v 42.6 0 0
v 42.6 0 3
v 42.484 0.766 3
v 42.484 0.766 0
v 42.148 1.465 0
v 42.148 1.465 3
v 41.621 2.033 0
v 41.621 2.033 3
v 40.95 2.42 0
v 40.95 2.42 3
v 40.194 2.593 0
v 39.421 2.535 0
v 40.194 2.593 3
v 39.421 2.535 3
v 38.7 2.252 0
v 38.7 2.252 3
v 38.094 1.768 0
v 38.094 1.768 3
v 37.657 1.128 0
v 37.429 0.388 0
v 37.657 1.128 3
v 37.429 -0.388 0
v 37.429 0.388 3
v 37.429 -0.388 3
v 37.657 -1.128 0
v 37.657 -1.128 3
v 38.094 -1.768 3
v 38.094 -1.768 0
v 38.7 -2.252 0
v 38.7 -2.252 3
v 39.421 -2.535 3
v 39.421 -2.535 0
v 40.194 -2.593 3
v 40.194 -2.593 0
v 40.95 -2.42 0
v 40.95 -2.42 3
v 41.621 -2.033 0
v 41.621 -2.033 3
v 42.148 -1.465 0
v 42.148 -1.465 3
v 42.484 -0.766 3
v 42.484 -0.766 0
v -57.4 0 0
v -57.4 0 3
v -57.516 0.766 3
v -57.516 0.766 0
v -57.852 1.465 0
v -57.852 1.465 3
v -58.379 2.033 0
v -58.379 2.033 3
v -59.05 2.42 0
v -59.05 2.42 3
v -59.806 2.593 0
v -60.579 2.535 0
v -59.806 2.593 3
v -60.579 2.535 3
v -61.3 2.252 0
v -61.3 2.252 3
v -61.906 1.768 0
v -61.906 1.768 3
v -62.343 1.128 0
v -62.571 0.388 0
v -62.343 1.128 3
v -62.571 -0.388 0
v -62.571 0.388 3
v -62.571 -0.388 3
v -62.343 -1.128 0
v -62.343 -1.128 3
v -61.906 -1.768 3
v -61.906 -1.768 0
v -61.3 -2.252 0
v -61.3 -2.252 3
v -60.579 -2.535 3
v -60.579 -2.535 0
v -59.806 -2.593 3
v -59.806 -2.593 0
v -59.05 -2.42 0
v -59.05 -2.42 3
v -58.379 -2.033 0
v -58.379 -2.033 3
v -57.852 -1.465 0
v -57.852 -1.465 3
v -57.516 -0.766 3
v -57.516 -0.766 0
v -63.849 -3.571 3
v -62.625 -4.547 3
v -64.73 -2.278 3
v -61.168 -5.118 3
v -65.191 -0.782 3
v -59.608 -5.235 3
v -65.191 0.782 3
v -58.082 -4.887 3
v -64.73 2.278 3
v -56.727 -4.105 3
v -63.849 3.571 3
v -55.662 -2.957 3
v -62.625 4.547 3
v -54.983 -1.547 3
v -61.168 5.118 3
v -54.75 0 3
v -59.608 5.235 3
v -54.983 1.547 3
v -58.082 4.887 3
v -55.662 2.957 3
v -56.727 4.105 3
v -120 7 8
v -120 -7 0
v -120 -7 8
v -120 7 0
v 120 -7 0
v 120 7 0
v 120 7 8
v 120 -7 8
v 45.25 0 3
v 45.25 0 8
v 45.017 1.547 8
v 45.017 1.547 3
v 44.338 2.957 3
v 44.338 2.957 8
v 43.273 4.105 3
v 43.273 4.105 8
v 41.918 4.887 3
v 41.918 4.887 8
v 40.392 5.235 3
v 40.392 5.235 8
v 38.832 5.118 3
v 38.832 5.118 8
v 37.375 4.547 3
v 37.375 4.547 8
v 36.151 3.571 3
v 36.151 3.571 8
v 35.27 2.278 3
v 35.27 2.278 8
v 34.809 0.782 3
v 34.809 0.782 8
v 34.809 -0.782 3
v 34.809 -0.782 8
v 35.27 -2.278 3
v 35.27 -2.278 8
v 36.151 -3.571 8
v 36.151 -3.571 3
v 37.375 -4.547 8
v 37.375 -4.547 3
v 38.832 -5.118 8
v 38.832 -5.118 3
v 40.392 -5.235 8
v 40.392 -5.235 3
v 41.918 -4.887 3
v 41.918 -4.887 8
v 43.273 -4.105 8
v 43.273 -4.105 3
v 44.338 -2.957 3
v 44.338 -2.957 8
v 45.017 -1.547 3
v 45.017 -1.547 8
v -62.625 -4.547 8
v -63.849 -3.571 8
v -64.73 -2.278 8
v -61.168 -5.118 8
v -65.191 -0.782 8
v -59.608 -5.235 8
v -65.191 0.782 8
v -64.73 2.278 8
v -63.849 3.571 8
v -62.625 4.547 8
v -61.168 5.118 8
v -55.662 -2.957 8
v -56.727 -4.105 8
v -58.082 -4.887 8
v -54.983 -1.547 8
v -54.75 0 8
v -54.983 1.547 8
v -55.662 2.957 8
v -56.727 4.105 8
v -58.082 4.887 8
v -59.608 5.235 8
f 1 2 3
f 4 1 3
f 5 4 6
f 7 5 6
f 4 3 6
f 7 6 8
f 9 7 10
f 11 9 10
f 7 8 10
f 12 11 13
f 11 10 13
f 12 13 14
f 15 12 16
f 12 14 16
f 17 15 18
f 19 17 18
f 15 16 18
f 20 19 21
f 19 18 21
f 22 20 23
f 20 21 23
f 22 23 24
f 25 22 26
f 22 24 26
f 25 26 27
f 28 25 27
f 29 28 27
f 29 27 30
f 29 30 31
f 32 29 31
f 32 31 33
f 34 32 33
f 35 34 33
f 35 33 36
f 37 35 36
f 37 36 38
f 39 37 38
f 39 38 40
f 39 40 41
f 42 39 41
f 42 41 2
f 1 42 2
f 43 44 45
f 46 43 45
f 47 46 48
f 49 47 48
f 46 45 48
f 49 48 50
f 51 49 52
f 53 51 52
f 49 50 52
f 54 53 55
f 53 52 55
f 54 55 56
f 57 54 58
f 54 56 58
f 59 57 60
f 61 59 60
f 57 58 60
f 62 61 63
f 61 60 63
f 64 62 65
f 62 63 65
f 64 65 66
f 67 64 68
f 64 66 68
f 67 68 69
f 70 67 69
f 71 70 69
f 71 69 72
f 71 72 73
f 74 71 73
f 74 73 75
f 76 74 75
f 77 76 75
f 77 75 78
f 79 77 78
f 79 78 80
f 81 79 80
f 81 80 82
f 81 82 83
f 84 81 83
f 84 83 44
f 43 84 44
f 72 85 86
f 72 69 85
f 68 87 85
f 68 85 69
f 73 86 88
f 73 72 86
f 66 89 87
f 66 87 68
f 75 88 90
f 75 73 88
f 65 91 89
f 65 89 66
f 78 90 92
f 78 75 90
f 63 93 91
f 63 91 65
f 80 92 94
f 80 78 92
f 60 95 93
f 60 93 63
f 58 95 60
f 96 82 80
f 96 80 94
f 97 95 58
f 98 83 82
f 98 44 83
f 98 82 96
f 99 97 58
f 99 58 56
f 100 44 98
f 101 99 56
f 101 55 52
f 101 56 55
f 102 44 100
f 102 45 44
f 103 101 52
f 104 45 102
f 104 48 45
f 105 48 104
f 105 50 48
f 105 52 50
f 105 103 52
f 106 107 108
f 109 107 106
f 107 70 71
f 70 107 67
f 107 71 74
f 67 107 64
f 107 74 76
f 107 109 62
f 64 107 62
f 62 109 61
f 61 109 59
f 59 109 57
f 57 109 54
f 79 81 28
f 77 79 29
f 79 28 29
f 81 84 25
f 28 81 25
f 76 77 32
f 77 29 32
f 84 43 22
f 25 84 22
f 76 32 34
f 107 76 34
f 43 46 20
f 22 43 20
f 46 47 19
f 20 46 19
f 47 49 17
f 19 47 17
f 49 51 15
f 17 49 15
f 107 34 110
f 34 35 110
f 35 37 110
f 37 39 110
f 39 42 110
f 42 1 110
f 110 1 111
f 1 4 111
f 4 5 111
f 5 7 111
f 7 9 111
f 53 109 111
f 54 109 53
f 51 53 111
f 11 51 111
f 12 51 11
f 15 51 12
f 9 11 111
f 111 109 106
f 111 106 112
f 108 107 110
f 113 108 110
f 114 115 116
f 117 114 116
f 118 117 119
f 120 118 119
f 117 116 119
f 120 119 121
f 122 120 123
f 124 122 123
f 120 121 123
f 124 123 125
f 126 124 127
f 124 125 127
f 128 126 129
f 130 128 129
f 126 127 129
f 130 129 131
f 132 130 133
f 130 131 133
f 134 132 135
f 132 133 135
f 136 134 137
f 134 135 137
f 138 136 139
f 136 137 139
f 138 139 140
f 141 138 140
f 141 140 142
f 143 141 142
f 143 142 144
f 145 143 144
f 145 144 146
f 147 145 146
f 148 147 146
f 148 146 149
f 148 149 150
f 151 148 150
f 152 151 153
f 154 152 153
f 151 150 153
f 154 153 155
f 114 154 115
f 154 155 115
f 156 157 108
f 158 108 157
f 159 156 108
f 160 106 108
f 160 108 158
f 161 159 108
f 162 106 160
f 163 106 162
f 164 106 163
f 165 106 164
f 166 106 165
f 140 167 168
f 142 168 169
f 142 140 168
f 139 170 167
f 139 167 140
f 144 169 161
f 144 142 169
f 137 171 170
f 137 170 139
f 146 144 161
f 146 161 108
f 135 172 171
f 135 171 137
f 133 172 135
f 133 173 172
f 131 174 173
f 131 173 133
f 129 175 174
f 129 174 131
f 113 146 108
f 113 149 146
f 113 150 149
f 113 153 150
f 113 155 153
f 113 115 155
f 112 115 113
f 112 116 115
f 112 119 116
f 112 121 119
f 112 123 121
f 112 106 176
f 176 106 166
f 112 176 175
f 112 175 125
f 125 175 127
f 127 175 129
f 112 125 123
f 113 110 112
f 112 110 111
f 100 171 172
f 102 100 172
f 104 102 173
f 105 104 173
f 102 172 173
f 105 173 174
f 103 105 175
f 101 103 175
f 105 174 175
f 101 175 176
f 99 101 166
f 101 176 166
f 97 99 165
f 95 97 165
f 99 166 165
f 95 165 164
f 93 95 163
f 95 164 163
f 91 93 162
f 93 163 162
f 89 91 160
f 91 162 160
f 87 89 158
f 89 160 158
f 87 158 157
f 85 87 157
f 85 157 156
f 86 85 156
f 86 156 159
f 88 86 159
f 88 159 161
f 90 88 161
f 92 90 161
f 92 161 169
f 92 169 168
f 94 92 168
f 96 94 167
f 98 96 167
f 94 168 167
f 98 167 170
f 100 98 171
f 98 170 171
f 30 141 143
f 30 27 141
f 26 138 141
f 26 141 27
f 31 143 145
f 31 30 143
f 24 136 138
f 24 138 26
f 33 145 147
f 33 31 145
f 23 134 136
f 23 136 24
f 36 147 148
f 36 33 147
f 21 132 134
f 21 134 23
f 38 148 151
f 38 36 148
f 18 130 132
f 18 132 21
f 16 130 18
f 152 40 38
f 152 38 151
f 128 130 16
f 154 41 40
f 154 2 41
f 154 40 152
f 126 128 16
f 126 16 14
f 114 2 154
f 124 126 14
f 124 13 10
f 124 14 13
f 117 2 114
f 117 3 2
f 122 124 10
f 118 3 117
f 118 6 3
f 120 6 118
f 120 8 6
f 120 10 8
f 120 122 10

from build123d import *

# Parameters (mm, degrees)
F0_W     = 240
F0_H     = 14
F1_DEPTH = 8
F2_R     = 2.6
F3_DEPTH = 8.001
F2_R_2   = 5.25
F4_DEPTH = 5


with BuildPart() as f1:
    # F0 (on Top) → F1 (new body)
    with BuildSketch(Plane.XY):
        Rectangle(F0_W, F0_H)
    extrude(amount=F1_DEPTH)

    # F2 (on face) → F3 (cut, through all)
    with BuildSketch(Plane.XY.offset(8)):
        with Locations((-60, 0)):
            Circle(F2_R)
        with Locations((40, 0)):
            Circle(F2_R)
    extrude(amount=-F3_DEPTH, mode=Mode.SUBTRACT)

    # F2 (on face) → F4 (cut)
    with BuildSketch(Plane.XY.offset(8)):
        with Locations((-60, 0)):
            Circle(F2_R_2)
        with Locations((-60, 0)):
            Circle(F2_R, mode=Mode.SUBTRACT)
        with Locations((40, 0)):
            Circle(F2_R_2)
        with Locations((40, 0)):
            Circle(F2_R, mode=Mode.SUBTRACT)
    extrude(amount=-F4_DEPTH, mode=Mode.SUBTRACT)


solid = f1.part
